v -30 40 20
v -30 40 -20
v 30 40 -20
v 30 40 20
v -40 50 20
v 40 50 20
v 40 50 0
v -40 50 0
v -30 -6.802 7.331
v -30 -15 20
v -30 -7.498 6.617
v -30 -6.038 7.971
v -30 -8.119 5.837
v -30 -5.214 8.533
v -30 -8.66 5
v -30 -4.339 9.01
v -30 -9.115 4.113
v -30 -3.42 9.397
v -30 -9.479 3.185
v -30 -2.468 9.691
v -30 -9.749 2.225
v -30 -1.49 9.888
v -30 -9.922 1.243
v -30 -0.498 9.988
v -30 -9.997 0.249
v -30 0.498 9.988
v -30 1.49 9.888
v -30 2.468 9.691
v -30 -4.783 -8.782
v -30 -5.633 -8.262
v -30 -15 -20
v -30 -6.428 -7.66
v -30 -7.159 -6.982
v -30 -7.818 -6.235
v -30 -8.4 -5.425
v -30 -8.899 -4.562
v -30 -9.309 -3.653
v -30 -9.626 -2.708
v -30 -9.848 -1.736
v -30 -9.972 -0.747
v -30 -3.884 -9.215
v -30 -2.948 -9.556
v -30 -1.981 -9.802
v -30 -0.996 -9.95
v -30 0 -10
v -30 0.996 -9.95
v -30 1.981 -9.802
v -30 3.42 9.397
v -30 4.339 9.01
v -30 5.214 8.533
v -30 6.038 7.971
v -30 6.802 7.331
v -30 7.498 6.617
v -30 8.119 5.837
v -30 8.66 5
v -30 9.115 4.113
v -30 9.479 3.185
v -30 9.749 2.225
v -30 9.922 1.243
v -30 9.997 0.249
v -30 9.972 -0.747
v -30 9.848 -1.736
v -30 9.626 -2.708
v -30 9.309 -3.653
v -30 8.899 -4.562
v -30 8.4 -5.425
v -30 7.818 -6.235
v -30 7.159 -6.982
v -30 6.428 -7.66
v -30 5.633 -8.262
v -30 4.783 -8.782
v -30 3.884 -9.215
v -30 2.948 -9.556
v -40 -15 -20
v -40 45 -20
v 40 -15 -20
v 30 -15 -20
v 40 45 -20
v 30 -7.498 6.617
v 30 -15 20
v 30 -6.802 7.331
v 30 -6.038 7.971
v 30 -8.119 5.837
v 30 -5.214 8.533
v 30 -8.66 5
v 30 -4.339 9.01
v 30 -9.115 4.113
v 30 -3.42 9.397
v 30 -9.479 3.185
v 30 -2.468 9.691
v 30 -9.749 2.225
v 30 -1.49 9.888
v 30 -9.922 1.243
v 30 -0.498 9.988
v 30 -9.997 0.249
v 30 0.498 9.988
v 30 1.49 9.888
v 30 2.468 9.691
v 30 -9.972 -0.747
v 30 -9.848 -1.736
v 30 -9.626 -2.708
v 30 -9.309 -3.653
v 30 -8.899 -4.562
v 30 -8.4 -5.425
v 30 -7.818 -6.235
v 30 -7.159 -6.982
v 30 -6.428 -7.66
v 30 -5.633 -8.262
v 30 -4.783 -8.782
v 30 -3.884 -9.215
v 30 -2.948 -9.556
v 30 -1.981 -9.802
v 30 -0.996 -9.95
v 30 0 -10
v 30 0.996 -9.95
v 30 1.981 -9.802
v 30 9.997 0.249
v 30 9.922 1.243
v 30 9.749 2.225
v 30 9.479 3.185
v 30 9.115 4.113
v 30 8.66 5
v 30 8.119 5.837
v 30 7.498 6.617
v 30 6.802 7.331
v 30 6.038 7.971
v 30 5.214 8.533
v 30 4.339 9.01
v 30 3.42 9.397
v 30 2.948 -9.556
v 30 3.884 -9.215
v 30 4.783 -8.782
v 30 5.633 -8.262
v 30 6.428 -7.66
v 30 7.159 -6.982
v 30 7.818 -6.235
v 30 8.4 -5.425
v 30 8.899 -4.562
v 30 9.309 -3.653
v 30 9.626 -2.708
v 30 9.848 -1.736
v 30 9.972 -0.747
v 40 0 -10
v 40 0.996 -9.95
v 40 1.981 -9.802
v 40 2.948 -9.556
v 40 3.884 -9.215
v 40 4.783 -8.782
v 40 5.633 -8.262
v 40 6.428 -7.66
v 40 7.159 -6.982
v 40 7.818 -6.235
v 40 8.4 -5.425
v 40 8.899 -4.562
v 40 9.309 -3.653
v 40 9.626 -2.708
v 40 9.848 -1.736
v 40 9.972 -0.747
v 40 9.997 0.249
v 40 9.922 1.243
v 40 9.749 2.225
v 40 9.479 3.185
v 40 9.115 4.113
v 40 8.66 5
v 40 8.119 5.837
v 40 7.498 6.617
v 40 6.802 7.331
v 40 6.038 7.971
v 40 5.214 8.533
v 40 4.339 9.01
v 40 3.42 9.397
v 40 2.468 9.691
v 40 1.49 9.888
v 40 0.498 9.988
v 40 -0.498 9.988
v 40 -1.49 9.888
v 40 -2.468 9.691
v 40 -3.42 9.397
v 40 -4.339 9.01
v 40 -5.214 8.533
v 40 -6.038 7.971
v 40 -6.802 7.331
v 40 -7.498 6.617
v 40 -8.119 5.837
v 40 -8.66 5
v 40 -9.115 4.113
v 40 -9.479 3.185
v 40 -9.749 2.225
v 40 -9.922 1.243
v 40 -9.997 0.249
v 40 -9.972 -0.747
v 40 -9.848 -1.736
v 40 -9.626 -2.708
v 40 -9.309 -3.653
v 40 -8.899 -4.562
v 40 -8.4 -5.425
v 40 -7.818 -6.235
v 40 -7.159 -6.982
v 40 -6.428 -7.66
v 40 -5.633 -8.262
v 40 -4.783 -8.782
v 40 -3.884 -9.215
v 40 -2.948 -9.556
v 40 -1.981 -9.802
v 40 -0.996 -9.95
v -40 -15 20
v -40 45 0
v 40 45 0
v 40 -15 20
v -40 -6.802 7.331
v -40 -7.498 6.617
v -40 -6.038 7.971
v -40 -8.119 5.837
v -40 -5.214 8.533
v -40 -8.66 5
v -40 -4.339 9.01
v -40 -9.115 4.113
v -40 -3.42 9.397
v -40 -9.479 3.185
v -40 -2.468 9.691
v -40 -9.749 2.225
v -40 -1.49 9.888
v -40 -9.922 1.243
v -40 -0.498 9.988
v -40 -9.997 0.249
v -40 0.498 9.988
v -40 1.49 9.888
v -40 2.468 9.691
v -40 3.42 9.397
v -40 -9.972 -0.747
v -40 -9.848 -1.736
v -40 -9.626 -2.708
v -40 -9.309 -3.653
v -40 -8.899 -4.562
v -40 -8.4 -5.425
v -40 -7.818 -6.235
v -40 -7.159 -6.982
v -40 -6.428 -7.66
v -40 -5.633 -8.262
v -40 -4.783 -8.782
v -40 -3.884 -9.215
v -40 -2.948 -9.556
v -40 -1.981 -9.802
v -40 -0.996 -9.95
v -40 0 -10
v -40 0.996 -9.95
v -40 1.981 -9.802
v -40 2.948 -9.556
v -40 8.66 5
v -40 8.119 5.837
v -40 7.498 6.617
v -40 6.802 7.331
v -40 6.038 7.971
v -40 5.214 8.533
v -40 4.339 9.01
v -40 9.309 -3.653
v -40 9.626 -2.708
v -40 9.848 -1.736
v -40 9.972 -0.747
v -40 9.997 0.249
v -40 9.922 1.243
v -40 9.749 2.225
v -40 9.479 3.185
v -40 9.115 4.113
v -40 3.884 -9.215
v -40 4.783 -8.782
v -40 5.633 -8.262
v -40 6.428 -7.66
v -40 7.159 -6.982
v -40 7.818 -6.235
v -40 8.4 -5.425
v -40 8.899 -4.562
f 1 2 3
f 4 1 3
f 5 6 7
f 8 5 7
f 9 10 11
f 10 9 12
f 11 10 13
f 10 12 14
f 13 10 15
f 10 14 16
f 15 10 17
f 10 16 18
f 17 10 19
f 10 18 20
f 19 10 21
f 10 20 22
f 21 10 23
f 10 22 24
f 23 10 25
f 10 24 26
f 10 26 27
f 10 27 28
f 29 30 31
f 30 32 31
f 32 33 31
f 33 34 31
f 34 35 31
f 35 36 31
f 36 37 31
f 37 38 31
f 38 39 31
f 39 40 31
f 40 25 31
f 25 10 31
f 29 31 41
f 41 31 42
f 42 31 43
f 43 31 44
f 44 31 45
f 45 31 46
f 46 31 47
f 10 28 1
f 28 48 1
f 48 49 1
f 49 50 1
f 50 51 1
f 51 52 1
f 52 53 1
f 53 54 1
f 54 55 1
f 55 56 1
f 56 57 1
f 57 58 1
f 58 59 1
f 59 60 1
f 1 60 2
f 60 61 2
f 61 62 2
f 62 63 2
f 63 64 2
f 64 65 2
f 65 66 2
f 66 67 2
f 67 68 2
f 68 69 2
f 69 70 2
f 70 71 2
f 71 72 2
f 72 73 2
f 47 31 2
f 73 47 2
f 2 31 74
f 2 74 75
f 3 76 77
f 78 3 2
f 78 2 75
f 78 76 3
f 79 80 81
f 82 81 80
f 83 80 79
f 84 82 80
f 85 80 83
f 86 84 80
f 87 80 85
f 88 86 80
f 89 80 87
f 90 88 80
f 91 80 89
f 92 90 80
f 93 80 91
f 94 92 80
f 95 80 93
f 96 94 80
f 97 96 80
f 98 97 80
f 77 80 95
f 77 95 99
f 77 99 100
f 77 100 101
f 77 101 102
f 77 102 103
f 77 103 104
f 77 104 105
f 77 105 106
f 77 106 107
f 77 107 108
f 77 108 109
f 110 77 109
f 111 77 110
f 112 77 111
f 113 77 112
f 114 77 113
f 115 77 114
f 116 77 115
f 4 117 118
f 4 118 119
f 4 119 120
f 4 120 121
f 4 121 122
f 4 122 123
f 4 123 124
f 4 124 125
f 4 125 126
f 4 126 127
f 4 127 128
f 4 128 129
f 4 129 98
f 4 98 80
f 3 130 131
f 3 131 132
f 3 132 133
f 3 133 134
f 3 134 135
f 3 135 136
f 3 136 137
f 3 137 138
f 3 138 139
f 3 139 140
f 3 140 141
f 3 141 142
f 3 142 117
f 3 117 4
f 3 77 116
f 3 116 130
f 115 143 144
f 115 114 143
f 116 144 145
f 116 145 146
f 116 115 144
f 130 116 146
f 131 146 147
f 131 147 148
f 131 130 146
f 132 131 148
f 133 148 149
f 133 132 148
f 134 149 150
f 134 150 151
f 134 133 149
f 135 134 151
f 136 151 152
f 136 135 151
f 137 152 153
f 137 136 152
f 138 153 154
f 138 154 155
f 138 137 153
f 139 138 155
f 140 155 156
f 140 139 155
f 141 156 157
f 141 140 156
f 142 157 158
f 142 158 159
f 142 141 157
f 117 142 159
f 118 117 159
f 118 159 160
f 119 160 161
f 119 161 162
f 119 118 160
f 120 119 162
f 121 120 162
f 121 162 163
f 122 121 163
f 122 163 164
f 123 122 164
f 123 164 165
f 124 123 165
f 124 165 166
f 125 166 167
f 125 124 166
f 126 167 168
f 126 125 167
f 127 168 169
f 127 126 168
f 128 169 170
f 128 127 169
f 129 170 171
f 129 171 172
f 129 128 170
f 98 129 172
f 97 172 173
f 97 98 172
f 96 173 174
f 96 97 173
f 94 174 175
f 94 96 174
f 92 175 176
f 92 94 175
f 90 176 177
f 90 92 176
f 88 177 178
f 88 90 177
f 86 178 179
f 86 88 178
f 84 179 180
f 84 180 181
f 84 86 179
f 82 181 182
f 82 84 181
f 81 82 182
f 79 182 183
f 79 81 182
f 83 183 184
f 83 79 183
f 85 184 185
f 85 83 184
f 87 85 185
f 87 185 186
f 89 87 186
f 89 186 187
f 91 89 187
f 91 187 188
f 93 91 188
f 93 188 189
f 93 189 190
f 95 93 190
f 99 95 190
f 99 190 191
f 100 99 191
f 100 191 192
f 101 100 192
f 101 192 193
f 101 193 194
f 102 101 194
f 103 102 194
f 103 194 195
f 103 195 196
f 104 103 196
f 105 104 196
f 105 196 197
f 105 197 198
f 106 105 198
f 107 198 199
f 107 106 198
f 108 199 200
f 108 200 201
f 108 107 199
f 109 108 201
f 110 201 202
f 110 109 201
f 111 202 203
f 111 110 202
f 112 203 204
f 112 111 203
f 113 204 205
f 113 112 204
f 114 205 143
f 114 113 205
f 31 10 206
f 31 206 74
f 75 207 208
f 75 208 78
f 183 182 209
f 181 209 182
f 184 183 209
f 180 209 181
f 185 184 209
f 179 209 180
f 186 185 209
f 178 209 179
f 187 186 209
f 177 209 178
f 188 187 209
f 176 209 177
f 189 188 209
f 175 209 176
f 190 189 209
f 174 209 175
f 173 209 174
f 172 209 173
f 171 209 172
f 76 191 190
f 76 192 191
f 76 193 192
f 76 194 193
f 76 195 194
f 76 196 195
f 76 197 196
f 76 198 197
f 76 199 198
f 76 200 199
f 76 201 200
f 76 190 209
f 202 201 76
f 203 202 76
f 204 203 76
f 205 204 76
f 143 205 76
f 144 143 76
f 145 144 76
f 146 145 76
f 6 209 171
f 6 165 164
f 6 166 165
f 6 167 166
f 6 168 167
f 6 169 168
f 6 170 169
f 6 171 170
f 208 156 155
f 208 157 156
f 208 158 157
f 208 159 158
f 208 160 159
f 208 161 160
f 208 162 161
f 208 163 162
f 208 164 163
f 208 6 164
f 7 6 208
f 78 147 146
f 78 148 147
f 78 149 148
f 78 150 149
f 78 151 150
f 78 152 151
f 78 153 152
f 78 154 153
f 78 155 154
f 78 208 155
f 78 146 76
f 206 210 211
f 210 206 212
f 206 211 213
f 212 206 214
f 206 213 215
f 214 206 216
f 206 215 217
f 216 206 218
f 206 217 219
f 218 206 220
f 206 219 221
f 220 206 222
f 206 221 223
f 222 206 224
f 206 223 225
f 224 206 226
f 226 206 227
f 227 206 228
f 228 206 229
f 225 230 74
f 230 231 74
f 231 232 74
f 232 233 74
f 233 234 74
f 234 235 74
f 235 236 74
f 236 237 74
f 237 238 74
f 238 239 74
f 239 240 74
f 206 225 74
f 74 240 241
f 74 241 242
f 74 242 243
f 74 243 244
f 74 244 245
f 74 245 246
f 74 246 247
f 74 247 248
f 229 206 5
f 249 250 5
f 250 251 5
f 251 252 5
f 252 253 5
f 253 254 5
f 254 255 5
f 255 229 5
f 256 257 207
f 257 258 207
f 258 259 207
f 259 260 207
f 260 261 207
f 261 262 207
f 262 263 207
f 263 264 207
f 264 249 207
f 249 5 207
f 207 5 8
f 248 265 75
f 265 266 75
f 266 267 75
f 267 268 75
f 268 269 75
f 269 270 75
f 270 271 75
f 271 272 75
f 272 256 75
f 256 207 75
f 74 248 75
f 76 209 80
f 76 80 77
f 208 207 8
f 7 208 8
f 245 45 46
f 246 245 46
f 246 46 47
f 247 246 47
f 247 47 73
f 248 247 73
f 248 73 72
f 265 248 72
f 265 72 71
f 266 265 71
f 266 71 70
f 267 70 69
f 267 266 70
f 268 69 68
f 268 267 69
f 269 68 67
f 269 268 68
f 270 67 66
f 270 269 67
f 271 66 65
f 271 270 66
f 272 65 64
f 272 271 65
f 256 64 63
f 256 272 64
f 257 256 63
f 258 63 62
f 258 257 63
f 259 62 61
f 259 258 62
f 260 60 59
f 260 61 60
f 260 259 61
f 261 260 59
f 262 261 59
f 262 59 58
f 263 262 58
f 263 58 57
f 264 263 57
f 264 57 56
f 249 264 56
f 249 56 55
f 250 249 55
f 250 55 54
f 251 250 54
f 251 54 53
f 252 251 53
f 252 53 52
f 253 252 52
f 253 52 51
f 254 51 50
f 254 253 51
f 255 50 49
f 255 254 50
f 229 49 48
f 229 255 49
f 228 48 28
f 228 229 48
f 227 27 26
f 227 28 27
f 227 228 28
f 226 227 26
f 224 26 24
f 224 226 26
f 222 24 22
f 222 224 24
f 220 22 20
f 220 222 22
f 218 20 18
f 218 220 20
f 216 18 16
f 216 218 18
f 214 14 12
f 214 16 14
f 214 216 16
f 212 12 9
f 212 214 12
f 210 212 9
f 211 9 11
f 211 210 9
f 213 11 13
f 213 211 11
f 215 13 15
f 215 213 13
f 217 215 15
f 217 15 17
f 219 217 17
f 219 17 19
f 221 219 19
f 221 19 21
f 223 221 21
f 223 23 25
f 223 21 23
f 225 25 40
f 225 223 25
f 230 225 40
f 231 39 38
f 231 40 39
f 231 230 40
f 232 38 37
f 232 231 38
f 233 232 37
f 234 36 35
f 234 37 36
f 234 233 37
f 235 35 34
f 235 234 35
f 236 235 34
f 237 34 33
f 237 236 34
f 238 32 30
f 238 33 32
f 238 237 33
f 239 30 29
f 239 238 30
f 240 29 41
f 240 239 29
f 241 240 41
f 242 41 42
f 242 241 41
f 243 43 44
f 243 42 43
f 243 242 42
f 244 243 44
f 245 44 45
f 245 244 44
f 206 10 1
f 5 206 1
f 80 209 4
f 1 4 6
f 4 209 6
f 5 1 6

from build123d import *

# Parameters (mm, degrees)
CROQUIS1_W                 = 40
CROQUIS1_H                 = 65
CROQUIS1_R                 = 10
SALIENTE_EXTRUIR1_DEPTH    = 40
CROQUIS2_W                 = 60
CROQUIS2_H                 = 55
CORTAR_EXTRUIR1_DEPTH      = 21
CORTAR_EXTRUIR1_DEPTH_BACK = 21
CROQUIS3_W                 = 20
CROQUIS3_H                 = 5
CORTAR_EXTRUIR2_DEPTH      = 41
CORTAR_EXTRUIR2_DEPTH_BACK = 41


with BuildPart() as part:
    # Croquis1 → Saliente-Extruir1 (new body, symmetric)
    with BuildSketch(Plane(origin=(0, 0, 0), x_dir=(0, 0, -1), z_dir=(1, 0, 0))):
        with Locations((0, 17.5)):
            Rectangle(CROQUIS1_W, CROQUIS1_H)
        Circle(CROQUIS1_R, mode=Mode.SUBTRACT)
    extrude(amount=SALIENTE_EXTRUIR1_DEPTH, both=True)

    # Croquis2 → Cortar-Extruir1 (cut, two sides)
    with BuildSketch(Plane.XY) as cortar_extruir1_sk:
        with Locations((0, 12.5)):
            Rectangle(CROQUIS2_W, CROQUIS2_H)
    extrude(amount=CORTAR_EXTRUIR1_DEPTH, mode=Mode.SUBTRACT)
    extrude(cortar_extruir1_sk.sketch, amount=-CORTAR_EXTRUIR1_DEPTH_BACK, mode=Mode.SUBTRACT)

    # Croquis3 → Cortar-Extruir2 (cut, two sides)
    with BuildSketch(Plane(origin=(0, 0, 0), x_dir=(0, 0, -1), z_dir=(1, 0, 0))) as cortar_extruir2_sk:
        with Locations((10, 47.5)):
            Rectangle(CROQUIS3_W, CROQUIS3_H)
    extrude(amount=CORTAR_EXTRUIR2_DEPTH, mode=Mode.SUBTRACT)
    extrude(cortar_extruir2_sk.sketch, amount=-CORTAR_EXTRUIR2_DEPTH_BACK, mode=Mode.SUBTRACT)


solid = part.part
